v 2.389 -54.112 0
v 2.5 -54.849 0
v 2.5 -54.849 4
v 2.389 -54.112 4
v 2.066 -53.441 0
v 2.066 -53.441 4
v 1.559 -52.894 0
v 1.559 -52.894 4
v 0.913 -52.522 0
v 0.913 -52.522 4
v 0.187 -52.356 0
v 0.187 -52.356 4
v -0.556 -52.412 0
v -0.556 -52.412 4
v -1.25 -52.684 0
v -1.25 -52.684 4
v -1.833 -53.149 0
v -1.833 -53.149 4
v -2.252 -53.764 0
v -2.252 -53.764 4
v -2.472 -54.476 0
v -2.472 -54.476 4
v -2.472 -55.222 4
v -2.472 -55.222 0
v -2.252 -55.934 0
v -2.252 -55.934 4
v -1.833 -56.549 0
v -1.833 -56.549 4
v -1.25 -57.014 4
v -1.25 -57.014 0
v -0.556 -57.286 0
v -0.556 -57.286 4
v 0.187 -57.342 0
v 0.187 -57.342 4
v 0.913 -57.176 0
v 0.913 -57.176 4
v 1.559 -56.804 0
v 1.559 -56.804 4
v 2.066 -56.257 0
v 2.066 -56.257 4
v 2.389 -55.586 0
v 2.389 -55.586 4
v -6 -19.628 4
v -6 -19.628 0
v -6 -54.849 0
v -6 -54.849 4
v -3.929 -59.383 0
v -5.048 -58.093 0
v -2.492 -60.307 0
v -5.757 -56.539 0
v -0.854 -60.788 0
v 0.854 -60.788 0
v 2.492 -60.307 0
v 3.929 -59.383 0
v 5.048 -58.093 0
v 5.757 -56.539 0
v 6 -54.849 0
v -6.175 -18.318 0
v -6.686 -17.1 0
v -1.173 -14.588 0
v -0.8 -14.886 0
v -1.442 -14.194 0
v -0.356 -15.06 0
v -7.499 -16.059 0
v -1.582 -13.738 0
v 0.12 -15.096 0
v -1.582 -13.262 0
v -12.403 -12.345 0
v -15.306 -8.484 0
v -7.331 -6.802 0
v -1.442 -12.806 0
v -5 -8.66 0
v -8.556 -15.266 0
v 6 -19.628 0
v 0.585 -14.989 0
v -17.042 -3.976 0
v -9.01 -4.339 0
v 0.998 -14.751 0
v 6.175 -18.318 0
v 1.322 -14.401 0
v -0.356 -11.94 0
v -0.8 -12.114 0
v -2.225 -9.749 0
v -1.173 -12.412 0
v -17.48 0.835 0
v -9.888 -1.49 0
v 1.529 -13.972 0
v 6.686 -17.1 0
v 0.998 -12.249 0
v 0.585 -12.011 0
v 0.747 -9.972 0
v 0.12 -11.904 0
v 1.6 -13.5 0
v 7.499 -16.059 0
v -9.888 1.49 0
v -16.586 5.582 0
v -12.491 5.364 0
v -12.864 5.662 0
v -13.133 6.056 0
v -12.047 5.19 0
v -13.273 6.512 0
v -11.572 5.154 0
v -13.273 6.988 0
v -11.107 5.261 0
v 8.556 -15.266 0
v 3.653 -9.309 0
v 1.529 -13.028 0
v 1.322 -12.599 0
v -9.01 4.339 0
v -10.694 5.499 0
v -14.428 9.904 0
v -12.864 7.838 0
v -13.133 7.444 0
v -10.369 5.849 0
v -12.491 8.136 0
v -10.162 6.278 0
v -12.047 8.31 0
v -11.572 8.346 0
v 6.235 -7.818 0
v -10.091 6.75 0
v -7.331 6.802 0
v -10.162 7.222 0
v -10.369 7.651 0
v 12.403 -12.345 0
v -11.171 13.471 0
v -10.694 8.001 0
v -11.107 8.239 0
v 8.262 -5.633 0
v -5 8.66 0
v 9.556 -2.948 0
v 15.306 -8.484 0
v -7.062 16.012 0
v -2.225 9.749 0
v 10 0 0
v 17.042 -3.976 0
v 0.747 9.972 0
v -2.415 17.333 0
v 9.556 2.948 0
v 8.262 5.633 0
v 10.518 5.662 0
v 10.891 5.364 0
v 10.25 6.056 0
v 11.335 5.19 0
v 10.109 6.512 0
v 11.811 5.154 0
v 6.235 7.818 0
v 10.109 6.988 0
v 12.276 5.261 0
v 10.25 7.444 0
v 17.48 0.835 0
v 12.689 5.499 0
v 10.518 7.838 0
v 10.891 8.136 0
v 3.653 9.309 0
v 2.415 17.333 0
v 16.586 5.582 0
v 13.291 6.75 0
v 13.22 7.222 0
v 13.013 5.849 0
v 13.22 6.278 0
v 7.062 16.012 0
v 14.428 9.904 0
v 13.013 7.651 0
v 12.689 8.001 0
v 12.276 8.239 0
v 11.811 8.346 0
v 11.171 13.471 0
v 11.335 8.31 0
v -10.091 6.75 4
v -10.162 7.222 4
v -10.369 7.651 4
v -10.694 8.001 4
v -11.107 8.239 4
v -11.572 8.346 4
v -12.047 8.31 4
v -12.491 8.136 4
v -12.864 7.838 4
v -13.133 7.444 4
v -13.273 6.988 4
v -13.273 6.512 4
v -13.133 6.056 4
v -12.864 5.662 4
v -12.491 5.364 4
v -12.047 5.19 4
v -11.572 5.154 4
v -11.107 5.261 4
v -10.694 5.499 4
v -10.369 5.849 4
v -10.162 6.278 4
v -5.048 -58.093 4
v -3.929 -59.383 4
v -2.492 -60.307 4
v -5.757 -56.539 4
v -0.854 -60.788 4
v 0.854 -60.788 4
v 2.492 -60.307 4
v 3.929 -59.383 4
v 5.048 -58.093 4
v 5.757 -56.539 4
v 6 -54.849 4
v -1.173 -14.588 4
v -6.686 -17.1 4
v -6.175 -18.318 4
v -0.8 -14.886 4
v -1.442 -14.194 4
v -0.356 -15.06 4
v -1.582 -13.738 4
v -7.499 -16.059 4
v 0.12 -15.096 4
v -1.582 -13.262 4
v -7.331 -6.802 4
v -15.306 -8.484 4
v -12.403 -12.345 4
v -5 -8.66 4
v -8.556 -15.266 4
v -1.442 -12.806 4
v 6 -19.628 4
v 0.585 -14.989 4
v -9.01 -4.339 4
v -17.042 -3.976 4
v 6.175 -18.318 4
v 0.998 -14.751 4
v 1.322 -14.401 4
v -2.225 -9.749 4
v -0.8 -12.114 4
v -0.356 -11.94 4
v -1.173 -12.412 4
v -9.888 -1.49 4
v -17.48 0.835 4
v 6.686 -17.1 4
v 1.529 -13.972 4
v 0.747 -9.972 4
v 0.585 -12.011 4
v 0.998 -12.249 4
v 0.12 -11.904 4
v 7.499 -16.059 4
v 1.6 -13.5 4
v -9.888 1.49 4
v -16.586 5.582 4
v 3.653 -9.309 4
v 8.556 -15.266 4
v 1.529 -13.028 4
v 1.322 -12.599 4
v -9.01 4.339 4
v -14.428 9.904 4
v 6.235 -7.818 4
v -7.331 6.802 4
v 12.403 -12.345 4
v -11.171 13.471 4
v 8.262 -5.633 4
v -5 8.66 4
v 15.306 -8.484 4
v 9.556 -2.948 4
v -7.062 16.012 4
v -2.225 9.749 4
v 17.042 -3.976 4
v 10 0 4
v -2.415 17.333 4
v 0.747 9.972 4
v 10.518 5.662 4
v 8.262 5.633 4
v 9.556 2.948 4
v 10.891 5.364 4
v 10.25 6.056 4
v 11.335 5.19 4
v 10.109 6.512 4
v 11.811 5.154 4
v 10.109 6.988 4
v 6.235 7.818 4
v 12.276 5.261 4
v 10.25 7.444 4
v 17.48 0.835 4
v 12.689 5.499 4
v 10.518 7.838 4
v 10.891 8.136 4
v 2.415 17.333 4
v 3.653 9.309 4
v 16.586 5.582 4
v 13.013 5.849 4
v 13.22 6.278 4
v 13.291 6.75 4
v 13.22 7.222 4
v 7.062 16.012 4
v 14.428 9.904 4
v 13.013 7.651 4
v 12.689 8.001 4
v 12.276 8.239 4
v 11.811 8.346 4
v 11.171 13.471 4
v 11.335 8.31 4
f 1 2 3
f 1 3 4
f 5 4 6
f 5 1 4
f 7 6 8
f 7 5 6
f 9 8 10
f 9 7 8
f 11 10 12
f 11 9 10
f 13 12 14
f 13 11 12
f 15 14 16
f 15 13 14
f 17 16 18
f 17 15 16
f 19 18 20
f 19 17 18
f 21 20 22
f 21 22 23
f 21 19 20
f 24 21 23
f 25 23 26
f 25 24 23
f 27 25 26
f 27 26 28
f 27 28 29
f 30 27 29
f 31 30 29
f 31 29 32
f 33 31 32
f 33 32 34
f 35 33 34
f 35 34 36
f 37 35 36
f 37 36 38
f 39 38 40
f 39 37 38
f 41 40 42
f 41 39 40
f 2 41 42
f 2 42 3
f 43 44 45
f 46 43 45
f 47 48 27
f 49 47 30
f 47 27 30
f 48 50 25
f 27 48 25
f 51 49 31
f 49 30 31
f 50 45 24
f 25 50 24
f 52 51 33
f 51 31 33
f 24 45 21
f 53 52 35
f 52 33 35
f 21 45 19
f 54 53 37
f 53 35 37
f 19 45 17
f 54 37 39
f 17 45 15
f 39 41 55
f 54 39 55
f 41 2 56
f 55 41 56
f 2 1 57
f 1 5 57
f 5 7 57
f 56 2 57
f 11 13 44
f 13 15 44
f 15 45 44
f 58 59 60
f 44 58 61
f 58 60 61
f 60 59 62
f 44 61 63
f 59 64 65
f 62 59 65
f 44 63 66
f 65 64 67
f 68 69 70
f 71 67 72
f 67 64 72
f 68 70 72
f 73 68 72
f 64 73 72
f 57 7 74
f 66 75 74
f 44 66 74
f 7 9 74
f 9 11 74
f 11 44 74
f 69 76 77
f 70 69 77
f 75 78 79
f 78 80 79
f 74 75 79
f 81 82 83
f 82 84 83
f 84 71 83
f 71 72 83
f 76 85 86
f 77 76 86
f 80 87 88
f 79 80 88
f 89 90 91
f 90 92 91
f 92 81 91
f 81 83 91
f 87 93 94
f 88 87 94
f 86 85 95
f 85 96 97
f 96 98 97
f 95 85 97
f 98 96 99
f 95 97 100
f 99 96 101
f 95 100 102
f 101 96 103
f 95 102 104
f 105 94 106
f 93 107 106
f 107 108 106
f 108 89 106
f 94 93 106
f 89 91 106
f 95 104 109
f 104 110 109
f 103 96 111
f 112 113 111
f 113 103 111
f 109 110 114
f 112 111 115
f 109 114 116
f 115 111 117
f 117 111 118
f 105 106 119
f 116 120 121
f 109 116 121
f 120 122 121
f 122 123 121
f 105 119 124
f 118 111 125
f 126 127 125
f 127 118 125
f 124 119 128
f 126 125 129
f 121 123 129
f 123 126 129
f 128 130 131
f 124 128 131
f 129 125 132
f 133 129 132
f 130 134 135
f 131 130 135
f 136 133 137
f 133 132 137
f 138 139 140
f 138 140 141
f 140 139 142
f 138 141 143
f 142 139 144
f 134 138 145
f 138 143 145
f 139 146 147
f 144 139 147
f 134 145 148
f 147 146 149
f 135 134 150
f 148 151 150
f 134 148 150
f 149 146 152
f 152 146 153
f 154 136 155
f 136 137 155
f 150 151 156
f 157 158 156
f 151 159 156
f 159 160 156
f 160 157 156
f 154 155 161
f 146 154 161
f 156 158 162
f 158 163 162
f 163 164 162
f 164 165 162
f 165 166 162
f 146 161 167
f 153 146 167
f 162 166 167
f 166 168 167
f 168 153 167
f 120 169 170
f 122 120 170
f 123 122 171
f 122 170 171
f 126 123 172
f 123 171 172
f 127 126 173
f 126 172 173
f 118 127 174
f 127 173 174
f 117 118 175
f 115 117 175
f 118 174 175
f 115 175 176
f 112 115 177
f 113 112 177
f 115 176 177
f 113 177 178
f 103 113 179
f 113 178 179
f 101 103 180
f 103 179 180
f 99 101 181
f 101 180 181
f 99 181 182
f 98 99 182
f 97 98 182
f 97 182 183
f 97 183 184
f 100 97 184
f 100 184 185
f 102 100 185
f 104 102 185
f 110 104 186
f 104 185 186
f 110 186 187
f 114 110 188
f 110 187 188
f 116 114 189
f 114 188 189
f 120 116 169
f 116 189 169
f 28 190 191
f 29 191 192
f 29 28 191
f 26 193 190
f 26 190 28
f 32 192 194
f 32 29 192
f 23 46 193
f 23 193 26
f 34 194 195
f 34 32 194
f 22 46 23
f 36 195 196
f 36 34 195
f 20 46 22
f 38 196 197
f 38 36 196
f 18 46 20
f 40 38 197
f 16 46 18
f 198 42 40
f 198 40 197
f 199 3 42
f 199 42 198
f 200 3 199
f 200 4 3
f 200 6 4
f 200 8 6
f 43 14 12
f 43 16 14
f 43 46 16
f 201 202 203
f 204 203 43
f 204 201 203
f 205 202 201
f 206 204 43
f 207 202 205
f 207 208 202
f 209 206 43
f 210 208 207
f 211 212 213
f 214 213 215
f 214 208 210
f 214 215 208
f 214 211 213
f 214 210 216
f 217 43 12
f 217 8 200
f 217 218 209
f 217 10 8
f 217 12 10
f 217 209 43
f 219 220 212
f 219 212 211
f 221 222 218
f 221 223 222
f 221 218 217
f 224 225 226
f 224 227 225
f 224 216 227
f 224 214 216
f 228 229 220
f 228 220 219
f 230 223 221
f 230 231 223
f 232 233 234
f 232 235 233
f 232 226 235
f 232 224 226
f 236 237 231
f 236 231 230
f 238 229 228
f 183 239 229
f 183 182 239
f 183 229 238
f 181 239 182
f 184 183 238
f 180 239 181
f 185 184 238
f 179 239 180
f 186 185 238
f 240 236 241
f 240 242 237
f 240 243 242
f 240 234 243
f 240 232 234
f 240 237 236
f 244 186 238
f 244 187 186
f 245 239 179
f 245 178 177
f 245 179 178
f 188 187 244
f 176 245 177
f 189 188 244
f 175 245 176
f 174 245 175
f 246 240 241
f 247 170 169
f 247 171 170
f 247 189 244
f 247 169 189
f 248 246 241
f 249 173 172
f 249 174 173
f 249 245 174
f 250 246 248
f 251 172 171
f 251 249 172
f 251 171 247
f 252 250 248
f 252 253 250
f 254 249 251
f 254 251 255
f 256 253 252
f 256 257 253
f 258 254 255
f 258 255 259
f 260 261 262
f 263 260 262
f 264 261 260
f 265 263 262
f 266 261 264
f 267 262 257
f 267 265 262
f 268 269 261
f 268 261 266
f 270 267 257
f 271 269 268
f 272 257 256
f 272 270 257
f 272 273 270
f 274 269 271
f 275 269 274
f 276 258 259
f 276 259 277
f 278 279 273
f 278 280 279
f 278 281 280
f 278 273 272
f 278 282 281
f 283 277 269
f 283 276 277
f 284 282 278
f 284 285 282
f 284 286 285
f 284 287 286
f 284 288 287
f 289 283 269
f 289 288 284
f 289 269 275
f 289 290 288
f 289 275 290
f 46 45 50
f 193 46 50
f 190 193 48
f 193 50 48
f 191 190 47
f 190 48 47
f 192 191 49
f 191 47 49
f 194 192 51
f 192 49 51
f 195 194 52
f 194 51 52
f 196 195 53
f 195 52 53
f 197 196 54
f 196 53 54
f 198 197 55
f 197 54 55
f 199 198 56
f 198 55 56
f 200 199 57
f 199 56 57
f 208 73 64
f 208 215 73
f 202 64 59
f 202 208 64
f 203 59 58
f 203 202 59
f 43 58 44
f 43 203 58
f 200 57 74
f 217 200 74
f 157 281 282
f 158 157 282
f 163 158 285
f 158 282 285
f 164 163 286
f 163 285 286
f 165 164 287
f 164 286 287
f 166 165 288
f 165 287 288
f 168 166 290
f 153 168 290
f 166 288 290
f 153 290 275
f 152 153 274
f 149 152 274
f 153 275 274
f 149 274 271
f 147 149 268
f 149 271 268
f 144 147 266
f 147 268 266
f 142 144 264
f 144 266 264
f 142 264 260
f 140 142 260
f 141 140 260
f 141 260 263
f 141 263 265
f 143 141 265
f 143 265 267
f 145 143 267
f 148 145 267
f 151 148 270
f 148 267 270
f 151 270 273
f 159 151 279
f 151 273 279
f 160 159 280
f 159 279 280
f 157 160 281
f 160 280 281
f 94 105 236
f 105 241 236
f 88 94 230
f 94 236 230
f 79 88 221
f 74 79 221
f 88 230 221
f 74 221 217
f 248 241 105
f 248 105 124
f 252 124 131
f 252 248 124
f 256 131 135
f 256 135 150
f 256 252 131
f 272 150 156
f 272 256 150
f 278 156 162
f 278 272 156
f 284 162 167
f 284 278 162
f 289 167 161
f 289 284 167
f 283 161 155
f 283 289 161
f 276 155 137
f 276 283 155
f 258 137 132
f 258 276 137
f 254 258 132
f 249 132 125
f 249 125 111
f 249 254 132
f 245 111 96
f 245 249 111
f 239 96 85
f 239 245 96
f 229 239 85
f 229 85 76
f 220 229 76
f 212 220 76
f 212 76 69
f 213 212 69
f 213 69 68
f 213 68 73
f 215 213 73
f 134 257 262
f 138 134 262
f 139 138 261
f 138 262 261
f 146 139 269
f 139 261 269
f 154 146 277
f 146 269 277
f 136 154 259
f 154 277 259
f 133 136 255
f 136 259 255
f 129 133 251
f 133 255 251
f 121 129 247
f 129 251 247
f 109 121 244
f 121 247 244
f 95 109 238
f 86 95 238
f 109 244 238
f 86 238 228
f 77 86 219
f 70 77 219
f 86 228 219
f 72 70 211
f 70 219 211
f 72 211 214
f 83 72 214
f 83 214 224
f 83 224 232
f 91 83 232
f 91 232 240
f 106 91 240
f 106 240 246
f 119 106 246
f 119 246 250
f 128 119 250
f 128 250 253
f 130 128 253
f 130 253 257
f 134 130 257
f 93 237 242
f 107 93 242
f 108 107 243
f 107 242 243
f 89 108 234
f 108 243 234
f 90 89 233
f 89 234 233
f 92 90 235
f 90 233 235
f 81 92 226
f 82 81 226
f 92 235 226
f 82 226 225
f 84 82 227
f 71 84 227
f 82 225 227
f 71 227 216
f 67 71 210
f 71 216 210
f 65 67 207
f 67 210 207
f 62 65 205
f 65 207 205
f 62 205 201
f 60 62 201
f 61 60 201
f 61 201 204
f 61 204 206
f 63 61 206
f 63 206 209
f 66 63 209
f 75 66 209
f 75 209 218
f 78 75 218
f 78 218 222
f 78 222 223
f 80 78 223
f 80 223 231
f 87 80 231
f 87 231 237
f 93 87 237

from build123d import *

# Parameters (mm, degrees)
EXTRUDE_1_DEPTH     = 4
SKETCH_3_R          = 2.5
CUT_EXTRUDE_1_DEPTH = 24
SKETCH_4_R          = 1.525
CUT_EXTRUDE_2_DEPTH = 5
SKETCH_5_R          = 2.5
CUT_EXTRUDE_3_DEPTH = 5
FILLET_1_R          = 5
SKETCH_6_R          = 1.6
SKETCH_6_R_2        = 10
CUT_EXTRUDE_4_DEPTH = 10
SKETCH_7_R          = 17.5
SKETCH_7_R_2        = 10
SKETCH_7_R_3        = 1.6
EXTRUDE_2_DEPTH     = 4
FILLET_2_R          = 5
EXTRUDE_START       = -4
SKETCH_8_R          = 2.5
EXTRUDE_3_DEPTH     = 4
SKETCH_9_R          = 2.5
EXTRUDE_4_DEPTH     = 4


with BuildPart() as part:
    # 草图1 → 凸台-拉伸1 (new body)
    with BuildSketch(Plane.XY):
        with BuildLine():
            Line((6, -7.365459931), (6, -45))
            ThreePointArc((6, -45), (0, -51), (-6, -45))
            Line((-6, -45), (-6, -7.365459931))
            ThreePointArc((-6, -7.365459931), (0, 9.5), (6, -7.365459931))
        make_face()
    extrude(amount=EXTRUDE_1_DEPTH)

    # 草图3 → 切除-拉伸1 (cut)
    with BuildSketch(Plane.XY.offset(4)):
        with Locations((0, -45)):
            Circle(SKETCH_3_R)
    extrude(amount=-CUT_EXTRUDE_1_DEPTH, mode=Mode.SUBTRACT)

    # 草图4 → 切除-拉伸2 (cut)
    with BuildSketch(Plane.XY.offset(4)):
        with Locations((0, 6.25)):
            Circle(SKETCH_4_R)
        with Locations((0, -6.25)):
            Circle(SKETCH_4_R)
    extrude(amount=-CUT_EXTRUDE_2_DEPTH, mode=Mode.SUBTRACT)

    # 草图5 → 切除-拉伸3 (cut)
    with BuildSketch(Plane.XY.offset(4)):
        Circle(SKETCH_5_R)
    extrude(amount=-CUT_EXTRUDE_3_DEPTH, mode=Mode.SUBTRACT)

    # 圆角1
    fillet_1_edges = [part.edges().sort_by_distance(p)[0] for p in [
        (-6, -7.365459931, 2),
        (6, -7.365459931, 2),
    ]]
    fillet(fillet_1_edges, radius=FILLET_1_R)

    # 草图6 → 切除-拉伸4 (cut)
    with BuildSketch(Plane.XY.offset(4)):
        with Locations((0, -13.5)):
            Circle(SKETCH_6_R)
        Circle(SKETCH_6_R_2)
    extrude(amount=-CUT_EXTRUDE_4_DEPTH, mode=Mode.SUBTRACT)

    # 草图7 → 凸台-拉伸2 (add)
    with BuildSketch(Plane.XY.offset(4)):
        Circle(SKETCH_7_R)
        Circle(SKETCH_7_R_2, mode=Mode.SUBTRACT)
        with Locations((11.691342951, 6.75)):
            Circle(SKETCH_7_R_3, mode=Mode.SUBTRACT)
        with Locations((-11.691342951, 6.75)):
            Circle(SKETCH_7_R_3, mode=Mode.SUBTRACT)
        with Locations((0, -13.5)):
            Circle(SKETCH_7_R_3, mode=Mode.SUBTRACT)
    extrude(amount=-EXTRUDE_2_DEPTH)

    # 圆角2
    fillet_2_edges = [part.edges().sort_by_distance(p)[0] for p in [
        (6, -16.439282223, 2),
        (-6, -16.439282223, 2),
    ]]
    fillet(fillet_2_edges, radius=FILLET_2_R)

    # 草图8 → 凸台-拉伸3 (add)
    # profile 1 of 4: a face of its own
    with BuildSketch(Plane.XY.offset(4).offset(EXTRUDE_START)):
        with BuildLine():
            ThreePointArc((3.427769437, -49.924469178), (5.318205366, -52.071044966), (6, -54.848938357))
            Line((6, -54.848938357), (6, -45))
            ThreePointArc((6, -45), (5.318205366, -47.777893391), (3.427769437, -49.924469178))
        make_face()
    # profile 2 of 4: a face of its own
    with BuildSketch(Plane.XY.offset(4).offset(EXTRUDE_START)):
        with BuildLine():
            Line((-6, -45), (-6, -54.848938357))
            ThreePointArc((-6, -54.848938357), (-5.318205366, -52.071044966), (-3.427769437, -49.924469178))
            ThreePointArc((-3.427769437, -49.924469178), (-5.318205366, -47.777893391), (-6, -45))
        make_face()
    # profile 3 of 4: a face of its own
    with BuildSketch(Plane.XY.offset(4).offset(EXTRUDE_START)):
        with BuildLine():
            Line((-6, -40), (-6, -45))
            ThreePointArc((-6, -45), (-5.318205366, -47.777893391), (-3.427769437, -49.924469178))
            ThreePointArc((-3.427769437, -49.924469178), (0, -48.848938357), (3.427769437, -49.924469178))
            ThreePointArc((3.427769437, -49.924469178), (5.318205366, -47.777893391), (6, -45))
            Line((6, -45), (6, -40))
            Line((6, -40), (-6, -40))
        make_face()
        with Locations((0, -45)):
            Circle(SKETCH_8_R, mode=Mode.SUBTRACT)
    # profile 4 of 4: a face of its own
    with BuildSketch(Plane.XY.offset(4).offset(EXTRUDE_START)):
        with BuildLine():
            ThreePointArc((-3.427769437, -49.924469178), (-5.318205366, -52.071044966), (-6, -54.848938357))
            ThreePointArc((-6, -54.848938357), (0, -60.848938357), (6, -54.848938357))
            ThreePointArc((6, -54.848938357), (5.318205366, -52.071044966), (3.427769437, -49.924469178))
            ThreePointArc((3.427769437, -49.924469178), (0, -51), (-3.427769437, -49.924469178))
        make_face()
        with Locations((0, -54.848938357)):
            Circle(SKETCH_8_R, mode=Mode.SUBTRACT)
    extrude(amount=EXTRUDE_3_DEPTH)

    # 草图9 → 凸台-拉伸4 (add)
    with BuildSketch(Plane.XY.offset(4)):
        with Locations((0, -45)):
            Circle(SKETCH_9_R)
    extrude(amount=-EXTRUDE_4_DEPTH)


solid = part.part
